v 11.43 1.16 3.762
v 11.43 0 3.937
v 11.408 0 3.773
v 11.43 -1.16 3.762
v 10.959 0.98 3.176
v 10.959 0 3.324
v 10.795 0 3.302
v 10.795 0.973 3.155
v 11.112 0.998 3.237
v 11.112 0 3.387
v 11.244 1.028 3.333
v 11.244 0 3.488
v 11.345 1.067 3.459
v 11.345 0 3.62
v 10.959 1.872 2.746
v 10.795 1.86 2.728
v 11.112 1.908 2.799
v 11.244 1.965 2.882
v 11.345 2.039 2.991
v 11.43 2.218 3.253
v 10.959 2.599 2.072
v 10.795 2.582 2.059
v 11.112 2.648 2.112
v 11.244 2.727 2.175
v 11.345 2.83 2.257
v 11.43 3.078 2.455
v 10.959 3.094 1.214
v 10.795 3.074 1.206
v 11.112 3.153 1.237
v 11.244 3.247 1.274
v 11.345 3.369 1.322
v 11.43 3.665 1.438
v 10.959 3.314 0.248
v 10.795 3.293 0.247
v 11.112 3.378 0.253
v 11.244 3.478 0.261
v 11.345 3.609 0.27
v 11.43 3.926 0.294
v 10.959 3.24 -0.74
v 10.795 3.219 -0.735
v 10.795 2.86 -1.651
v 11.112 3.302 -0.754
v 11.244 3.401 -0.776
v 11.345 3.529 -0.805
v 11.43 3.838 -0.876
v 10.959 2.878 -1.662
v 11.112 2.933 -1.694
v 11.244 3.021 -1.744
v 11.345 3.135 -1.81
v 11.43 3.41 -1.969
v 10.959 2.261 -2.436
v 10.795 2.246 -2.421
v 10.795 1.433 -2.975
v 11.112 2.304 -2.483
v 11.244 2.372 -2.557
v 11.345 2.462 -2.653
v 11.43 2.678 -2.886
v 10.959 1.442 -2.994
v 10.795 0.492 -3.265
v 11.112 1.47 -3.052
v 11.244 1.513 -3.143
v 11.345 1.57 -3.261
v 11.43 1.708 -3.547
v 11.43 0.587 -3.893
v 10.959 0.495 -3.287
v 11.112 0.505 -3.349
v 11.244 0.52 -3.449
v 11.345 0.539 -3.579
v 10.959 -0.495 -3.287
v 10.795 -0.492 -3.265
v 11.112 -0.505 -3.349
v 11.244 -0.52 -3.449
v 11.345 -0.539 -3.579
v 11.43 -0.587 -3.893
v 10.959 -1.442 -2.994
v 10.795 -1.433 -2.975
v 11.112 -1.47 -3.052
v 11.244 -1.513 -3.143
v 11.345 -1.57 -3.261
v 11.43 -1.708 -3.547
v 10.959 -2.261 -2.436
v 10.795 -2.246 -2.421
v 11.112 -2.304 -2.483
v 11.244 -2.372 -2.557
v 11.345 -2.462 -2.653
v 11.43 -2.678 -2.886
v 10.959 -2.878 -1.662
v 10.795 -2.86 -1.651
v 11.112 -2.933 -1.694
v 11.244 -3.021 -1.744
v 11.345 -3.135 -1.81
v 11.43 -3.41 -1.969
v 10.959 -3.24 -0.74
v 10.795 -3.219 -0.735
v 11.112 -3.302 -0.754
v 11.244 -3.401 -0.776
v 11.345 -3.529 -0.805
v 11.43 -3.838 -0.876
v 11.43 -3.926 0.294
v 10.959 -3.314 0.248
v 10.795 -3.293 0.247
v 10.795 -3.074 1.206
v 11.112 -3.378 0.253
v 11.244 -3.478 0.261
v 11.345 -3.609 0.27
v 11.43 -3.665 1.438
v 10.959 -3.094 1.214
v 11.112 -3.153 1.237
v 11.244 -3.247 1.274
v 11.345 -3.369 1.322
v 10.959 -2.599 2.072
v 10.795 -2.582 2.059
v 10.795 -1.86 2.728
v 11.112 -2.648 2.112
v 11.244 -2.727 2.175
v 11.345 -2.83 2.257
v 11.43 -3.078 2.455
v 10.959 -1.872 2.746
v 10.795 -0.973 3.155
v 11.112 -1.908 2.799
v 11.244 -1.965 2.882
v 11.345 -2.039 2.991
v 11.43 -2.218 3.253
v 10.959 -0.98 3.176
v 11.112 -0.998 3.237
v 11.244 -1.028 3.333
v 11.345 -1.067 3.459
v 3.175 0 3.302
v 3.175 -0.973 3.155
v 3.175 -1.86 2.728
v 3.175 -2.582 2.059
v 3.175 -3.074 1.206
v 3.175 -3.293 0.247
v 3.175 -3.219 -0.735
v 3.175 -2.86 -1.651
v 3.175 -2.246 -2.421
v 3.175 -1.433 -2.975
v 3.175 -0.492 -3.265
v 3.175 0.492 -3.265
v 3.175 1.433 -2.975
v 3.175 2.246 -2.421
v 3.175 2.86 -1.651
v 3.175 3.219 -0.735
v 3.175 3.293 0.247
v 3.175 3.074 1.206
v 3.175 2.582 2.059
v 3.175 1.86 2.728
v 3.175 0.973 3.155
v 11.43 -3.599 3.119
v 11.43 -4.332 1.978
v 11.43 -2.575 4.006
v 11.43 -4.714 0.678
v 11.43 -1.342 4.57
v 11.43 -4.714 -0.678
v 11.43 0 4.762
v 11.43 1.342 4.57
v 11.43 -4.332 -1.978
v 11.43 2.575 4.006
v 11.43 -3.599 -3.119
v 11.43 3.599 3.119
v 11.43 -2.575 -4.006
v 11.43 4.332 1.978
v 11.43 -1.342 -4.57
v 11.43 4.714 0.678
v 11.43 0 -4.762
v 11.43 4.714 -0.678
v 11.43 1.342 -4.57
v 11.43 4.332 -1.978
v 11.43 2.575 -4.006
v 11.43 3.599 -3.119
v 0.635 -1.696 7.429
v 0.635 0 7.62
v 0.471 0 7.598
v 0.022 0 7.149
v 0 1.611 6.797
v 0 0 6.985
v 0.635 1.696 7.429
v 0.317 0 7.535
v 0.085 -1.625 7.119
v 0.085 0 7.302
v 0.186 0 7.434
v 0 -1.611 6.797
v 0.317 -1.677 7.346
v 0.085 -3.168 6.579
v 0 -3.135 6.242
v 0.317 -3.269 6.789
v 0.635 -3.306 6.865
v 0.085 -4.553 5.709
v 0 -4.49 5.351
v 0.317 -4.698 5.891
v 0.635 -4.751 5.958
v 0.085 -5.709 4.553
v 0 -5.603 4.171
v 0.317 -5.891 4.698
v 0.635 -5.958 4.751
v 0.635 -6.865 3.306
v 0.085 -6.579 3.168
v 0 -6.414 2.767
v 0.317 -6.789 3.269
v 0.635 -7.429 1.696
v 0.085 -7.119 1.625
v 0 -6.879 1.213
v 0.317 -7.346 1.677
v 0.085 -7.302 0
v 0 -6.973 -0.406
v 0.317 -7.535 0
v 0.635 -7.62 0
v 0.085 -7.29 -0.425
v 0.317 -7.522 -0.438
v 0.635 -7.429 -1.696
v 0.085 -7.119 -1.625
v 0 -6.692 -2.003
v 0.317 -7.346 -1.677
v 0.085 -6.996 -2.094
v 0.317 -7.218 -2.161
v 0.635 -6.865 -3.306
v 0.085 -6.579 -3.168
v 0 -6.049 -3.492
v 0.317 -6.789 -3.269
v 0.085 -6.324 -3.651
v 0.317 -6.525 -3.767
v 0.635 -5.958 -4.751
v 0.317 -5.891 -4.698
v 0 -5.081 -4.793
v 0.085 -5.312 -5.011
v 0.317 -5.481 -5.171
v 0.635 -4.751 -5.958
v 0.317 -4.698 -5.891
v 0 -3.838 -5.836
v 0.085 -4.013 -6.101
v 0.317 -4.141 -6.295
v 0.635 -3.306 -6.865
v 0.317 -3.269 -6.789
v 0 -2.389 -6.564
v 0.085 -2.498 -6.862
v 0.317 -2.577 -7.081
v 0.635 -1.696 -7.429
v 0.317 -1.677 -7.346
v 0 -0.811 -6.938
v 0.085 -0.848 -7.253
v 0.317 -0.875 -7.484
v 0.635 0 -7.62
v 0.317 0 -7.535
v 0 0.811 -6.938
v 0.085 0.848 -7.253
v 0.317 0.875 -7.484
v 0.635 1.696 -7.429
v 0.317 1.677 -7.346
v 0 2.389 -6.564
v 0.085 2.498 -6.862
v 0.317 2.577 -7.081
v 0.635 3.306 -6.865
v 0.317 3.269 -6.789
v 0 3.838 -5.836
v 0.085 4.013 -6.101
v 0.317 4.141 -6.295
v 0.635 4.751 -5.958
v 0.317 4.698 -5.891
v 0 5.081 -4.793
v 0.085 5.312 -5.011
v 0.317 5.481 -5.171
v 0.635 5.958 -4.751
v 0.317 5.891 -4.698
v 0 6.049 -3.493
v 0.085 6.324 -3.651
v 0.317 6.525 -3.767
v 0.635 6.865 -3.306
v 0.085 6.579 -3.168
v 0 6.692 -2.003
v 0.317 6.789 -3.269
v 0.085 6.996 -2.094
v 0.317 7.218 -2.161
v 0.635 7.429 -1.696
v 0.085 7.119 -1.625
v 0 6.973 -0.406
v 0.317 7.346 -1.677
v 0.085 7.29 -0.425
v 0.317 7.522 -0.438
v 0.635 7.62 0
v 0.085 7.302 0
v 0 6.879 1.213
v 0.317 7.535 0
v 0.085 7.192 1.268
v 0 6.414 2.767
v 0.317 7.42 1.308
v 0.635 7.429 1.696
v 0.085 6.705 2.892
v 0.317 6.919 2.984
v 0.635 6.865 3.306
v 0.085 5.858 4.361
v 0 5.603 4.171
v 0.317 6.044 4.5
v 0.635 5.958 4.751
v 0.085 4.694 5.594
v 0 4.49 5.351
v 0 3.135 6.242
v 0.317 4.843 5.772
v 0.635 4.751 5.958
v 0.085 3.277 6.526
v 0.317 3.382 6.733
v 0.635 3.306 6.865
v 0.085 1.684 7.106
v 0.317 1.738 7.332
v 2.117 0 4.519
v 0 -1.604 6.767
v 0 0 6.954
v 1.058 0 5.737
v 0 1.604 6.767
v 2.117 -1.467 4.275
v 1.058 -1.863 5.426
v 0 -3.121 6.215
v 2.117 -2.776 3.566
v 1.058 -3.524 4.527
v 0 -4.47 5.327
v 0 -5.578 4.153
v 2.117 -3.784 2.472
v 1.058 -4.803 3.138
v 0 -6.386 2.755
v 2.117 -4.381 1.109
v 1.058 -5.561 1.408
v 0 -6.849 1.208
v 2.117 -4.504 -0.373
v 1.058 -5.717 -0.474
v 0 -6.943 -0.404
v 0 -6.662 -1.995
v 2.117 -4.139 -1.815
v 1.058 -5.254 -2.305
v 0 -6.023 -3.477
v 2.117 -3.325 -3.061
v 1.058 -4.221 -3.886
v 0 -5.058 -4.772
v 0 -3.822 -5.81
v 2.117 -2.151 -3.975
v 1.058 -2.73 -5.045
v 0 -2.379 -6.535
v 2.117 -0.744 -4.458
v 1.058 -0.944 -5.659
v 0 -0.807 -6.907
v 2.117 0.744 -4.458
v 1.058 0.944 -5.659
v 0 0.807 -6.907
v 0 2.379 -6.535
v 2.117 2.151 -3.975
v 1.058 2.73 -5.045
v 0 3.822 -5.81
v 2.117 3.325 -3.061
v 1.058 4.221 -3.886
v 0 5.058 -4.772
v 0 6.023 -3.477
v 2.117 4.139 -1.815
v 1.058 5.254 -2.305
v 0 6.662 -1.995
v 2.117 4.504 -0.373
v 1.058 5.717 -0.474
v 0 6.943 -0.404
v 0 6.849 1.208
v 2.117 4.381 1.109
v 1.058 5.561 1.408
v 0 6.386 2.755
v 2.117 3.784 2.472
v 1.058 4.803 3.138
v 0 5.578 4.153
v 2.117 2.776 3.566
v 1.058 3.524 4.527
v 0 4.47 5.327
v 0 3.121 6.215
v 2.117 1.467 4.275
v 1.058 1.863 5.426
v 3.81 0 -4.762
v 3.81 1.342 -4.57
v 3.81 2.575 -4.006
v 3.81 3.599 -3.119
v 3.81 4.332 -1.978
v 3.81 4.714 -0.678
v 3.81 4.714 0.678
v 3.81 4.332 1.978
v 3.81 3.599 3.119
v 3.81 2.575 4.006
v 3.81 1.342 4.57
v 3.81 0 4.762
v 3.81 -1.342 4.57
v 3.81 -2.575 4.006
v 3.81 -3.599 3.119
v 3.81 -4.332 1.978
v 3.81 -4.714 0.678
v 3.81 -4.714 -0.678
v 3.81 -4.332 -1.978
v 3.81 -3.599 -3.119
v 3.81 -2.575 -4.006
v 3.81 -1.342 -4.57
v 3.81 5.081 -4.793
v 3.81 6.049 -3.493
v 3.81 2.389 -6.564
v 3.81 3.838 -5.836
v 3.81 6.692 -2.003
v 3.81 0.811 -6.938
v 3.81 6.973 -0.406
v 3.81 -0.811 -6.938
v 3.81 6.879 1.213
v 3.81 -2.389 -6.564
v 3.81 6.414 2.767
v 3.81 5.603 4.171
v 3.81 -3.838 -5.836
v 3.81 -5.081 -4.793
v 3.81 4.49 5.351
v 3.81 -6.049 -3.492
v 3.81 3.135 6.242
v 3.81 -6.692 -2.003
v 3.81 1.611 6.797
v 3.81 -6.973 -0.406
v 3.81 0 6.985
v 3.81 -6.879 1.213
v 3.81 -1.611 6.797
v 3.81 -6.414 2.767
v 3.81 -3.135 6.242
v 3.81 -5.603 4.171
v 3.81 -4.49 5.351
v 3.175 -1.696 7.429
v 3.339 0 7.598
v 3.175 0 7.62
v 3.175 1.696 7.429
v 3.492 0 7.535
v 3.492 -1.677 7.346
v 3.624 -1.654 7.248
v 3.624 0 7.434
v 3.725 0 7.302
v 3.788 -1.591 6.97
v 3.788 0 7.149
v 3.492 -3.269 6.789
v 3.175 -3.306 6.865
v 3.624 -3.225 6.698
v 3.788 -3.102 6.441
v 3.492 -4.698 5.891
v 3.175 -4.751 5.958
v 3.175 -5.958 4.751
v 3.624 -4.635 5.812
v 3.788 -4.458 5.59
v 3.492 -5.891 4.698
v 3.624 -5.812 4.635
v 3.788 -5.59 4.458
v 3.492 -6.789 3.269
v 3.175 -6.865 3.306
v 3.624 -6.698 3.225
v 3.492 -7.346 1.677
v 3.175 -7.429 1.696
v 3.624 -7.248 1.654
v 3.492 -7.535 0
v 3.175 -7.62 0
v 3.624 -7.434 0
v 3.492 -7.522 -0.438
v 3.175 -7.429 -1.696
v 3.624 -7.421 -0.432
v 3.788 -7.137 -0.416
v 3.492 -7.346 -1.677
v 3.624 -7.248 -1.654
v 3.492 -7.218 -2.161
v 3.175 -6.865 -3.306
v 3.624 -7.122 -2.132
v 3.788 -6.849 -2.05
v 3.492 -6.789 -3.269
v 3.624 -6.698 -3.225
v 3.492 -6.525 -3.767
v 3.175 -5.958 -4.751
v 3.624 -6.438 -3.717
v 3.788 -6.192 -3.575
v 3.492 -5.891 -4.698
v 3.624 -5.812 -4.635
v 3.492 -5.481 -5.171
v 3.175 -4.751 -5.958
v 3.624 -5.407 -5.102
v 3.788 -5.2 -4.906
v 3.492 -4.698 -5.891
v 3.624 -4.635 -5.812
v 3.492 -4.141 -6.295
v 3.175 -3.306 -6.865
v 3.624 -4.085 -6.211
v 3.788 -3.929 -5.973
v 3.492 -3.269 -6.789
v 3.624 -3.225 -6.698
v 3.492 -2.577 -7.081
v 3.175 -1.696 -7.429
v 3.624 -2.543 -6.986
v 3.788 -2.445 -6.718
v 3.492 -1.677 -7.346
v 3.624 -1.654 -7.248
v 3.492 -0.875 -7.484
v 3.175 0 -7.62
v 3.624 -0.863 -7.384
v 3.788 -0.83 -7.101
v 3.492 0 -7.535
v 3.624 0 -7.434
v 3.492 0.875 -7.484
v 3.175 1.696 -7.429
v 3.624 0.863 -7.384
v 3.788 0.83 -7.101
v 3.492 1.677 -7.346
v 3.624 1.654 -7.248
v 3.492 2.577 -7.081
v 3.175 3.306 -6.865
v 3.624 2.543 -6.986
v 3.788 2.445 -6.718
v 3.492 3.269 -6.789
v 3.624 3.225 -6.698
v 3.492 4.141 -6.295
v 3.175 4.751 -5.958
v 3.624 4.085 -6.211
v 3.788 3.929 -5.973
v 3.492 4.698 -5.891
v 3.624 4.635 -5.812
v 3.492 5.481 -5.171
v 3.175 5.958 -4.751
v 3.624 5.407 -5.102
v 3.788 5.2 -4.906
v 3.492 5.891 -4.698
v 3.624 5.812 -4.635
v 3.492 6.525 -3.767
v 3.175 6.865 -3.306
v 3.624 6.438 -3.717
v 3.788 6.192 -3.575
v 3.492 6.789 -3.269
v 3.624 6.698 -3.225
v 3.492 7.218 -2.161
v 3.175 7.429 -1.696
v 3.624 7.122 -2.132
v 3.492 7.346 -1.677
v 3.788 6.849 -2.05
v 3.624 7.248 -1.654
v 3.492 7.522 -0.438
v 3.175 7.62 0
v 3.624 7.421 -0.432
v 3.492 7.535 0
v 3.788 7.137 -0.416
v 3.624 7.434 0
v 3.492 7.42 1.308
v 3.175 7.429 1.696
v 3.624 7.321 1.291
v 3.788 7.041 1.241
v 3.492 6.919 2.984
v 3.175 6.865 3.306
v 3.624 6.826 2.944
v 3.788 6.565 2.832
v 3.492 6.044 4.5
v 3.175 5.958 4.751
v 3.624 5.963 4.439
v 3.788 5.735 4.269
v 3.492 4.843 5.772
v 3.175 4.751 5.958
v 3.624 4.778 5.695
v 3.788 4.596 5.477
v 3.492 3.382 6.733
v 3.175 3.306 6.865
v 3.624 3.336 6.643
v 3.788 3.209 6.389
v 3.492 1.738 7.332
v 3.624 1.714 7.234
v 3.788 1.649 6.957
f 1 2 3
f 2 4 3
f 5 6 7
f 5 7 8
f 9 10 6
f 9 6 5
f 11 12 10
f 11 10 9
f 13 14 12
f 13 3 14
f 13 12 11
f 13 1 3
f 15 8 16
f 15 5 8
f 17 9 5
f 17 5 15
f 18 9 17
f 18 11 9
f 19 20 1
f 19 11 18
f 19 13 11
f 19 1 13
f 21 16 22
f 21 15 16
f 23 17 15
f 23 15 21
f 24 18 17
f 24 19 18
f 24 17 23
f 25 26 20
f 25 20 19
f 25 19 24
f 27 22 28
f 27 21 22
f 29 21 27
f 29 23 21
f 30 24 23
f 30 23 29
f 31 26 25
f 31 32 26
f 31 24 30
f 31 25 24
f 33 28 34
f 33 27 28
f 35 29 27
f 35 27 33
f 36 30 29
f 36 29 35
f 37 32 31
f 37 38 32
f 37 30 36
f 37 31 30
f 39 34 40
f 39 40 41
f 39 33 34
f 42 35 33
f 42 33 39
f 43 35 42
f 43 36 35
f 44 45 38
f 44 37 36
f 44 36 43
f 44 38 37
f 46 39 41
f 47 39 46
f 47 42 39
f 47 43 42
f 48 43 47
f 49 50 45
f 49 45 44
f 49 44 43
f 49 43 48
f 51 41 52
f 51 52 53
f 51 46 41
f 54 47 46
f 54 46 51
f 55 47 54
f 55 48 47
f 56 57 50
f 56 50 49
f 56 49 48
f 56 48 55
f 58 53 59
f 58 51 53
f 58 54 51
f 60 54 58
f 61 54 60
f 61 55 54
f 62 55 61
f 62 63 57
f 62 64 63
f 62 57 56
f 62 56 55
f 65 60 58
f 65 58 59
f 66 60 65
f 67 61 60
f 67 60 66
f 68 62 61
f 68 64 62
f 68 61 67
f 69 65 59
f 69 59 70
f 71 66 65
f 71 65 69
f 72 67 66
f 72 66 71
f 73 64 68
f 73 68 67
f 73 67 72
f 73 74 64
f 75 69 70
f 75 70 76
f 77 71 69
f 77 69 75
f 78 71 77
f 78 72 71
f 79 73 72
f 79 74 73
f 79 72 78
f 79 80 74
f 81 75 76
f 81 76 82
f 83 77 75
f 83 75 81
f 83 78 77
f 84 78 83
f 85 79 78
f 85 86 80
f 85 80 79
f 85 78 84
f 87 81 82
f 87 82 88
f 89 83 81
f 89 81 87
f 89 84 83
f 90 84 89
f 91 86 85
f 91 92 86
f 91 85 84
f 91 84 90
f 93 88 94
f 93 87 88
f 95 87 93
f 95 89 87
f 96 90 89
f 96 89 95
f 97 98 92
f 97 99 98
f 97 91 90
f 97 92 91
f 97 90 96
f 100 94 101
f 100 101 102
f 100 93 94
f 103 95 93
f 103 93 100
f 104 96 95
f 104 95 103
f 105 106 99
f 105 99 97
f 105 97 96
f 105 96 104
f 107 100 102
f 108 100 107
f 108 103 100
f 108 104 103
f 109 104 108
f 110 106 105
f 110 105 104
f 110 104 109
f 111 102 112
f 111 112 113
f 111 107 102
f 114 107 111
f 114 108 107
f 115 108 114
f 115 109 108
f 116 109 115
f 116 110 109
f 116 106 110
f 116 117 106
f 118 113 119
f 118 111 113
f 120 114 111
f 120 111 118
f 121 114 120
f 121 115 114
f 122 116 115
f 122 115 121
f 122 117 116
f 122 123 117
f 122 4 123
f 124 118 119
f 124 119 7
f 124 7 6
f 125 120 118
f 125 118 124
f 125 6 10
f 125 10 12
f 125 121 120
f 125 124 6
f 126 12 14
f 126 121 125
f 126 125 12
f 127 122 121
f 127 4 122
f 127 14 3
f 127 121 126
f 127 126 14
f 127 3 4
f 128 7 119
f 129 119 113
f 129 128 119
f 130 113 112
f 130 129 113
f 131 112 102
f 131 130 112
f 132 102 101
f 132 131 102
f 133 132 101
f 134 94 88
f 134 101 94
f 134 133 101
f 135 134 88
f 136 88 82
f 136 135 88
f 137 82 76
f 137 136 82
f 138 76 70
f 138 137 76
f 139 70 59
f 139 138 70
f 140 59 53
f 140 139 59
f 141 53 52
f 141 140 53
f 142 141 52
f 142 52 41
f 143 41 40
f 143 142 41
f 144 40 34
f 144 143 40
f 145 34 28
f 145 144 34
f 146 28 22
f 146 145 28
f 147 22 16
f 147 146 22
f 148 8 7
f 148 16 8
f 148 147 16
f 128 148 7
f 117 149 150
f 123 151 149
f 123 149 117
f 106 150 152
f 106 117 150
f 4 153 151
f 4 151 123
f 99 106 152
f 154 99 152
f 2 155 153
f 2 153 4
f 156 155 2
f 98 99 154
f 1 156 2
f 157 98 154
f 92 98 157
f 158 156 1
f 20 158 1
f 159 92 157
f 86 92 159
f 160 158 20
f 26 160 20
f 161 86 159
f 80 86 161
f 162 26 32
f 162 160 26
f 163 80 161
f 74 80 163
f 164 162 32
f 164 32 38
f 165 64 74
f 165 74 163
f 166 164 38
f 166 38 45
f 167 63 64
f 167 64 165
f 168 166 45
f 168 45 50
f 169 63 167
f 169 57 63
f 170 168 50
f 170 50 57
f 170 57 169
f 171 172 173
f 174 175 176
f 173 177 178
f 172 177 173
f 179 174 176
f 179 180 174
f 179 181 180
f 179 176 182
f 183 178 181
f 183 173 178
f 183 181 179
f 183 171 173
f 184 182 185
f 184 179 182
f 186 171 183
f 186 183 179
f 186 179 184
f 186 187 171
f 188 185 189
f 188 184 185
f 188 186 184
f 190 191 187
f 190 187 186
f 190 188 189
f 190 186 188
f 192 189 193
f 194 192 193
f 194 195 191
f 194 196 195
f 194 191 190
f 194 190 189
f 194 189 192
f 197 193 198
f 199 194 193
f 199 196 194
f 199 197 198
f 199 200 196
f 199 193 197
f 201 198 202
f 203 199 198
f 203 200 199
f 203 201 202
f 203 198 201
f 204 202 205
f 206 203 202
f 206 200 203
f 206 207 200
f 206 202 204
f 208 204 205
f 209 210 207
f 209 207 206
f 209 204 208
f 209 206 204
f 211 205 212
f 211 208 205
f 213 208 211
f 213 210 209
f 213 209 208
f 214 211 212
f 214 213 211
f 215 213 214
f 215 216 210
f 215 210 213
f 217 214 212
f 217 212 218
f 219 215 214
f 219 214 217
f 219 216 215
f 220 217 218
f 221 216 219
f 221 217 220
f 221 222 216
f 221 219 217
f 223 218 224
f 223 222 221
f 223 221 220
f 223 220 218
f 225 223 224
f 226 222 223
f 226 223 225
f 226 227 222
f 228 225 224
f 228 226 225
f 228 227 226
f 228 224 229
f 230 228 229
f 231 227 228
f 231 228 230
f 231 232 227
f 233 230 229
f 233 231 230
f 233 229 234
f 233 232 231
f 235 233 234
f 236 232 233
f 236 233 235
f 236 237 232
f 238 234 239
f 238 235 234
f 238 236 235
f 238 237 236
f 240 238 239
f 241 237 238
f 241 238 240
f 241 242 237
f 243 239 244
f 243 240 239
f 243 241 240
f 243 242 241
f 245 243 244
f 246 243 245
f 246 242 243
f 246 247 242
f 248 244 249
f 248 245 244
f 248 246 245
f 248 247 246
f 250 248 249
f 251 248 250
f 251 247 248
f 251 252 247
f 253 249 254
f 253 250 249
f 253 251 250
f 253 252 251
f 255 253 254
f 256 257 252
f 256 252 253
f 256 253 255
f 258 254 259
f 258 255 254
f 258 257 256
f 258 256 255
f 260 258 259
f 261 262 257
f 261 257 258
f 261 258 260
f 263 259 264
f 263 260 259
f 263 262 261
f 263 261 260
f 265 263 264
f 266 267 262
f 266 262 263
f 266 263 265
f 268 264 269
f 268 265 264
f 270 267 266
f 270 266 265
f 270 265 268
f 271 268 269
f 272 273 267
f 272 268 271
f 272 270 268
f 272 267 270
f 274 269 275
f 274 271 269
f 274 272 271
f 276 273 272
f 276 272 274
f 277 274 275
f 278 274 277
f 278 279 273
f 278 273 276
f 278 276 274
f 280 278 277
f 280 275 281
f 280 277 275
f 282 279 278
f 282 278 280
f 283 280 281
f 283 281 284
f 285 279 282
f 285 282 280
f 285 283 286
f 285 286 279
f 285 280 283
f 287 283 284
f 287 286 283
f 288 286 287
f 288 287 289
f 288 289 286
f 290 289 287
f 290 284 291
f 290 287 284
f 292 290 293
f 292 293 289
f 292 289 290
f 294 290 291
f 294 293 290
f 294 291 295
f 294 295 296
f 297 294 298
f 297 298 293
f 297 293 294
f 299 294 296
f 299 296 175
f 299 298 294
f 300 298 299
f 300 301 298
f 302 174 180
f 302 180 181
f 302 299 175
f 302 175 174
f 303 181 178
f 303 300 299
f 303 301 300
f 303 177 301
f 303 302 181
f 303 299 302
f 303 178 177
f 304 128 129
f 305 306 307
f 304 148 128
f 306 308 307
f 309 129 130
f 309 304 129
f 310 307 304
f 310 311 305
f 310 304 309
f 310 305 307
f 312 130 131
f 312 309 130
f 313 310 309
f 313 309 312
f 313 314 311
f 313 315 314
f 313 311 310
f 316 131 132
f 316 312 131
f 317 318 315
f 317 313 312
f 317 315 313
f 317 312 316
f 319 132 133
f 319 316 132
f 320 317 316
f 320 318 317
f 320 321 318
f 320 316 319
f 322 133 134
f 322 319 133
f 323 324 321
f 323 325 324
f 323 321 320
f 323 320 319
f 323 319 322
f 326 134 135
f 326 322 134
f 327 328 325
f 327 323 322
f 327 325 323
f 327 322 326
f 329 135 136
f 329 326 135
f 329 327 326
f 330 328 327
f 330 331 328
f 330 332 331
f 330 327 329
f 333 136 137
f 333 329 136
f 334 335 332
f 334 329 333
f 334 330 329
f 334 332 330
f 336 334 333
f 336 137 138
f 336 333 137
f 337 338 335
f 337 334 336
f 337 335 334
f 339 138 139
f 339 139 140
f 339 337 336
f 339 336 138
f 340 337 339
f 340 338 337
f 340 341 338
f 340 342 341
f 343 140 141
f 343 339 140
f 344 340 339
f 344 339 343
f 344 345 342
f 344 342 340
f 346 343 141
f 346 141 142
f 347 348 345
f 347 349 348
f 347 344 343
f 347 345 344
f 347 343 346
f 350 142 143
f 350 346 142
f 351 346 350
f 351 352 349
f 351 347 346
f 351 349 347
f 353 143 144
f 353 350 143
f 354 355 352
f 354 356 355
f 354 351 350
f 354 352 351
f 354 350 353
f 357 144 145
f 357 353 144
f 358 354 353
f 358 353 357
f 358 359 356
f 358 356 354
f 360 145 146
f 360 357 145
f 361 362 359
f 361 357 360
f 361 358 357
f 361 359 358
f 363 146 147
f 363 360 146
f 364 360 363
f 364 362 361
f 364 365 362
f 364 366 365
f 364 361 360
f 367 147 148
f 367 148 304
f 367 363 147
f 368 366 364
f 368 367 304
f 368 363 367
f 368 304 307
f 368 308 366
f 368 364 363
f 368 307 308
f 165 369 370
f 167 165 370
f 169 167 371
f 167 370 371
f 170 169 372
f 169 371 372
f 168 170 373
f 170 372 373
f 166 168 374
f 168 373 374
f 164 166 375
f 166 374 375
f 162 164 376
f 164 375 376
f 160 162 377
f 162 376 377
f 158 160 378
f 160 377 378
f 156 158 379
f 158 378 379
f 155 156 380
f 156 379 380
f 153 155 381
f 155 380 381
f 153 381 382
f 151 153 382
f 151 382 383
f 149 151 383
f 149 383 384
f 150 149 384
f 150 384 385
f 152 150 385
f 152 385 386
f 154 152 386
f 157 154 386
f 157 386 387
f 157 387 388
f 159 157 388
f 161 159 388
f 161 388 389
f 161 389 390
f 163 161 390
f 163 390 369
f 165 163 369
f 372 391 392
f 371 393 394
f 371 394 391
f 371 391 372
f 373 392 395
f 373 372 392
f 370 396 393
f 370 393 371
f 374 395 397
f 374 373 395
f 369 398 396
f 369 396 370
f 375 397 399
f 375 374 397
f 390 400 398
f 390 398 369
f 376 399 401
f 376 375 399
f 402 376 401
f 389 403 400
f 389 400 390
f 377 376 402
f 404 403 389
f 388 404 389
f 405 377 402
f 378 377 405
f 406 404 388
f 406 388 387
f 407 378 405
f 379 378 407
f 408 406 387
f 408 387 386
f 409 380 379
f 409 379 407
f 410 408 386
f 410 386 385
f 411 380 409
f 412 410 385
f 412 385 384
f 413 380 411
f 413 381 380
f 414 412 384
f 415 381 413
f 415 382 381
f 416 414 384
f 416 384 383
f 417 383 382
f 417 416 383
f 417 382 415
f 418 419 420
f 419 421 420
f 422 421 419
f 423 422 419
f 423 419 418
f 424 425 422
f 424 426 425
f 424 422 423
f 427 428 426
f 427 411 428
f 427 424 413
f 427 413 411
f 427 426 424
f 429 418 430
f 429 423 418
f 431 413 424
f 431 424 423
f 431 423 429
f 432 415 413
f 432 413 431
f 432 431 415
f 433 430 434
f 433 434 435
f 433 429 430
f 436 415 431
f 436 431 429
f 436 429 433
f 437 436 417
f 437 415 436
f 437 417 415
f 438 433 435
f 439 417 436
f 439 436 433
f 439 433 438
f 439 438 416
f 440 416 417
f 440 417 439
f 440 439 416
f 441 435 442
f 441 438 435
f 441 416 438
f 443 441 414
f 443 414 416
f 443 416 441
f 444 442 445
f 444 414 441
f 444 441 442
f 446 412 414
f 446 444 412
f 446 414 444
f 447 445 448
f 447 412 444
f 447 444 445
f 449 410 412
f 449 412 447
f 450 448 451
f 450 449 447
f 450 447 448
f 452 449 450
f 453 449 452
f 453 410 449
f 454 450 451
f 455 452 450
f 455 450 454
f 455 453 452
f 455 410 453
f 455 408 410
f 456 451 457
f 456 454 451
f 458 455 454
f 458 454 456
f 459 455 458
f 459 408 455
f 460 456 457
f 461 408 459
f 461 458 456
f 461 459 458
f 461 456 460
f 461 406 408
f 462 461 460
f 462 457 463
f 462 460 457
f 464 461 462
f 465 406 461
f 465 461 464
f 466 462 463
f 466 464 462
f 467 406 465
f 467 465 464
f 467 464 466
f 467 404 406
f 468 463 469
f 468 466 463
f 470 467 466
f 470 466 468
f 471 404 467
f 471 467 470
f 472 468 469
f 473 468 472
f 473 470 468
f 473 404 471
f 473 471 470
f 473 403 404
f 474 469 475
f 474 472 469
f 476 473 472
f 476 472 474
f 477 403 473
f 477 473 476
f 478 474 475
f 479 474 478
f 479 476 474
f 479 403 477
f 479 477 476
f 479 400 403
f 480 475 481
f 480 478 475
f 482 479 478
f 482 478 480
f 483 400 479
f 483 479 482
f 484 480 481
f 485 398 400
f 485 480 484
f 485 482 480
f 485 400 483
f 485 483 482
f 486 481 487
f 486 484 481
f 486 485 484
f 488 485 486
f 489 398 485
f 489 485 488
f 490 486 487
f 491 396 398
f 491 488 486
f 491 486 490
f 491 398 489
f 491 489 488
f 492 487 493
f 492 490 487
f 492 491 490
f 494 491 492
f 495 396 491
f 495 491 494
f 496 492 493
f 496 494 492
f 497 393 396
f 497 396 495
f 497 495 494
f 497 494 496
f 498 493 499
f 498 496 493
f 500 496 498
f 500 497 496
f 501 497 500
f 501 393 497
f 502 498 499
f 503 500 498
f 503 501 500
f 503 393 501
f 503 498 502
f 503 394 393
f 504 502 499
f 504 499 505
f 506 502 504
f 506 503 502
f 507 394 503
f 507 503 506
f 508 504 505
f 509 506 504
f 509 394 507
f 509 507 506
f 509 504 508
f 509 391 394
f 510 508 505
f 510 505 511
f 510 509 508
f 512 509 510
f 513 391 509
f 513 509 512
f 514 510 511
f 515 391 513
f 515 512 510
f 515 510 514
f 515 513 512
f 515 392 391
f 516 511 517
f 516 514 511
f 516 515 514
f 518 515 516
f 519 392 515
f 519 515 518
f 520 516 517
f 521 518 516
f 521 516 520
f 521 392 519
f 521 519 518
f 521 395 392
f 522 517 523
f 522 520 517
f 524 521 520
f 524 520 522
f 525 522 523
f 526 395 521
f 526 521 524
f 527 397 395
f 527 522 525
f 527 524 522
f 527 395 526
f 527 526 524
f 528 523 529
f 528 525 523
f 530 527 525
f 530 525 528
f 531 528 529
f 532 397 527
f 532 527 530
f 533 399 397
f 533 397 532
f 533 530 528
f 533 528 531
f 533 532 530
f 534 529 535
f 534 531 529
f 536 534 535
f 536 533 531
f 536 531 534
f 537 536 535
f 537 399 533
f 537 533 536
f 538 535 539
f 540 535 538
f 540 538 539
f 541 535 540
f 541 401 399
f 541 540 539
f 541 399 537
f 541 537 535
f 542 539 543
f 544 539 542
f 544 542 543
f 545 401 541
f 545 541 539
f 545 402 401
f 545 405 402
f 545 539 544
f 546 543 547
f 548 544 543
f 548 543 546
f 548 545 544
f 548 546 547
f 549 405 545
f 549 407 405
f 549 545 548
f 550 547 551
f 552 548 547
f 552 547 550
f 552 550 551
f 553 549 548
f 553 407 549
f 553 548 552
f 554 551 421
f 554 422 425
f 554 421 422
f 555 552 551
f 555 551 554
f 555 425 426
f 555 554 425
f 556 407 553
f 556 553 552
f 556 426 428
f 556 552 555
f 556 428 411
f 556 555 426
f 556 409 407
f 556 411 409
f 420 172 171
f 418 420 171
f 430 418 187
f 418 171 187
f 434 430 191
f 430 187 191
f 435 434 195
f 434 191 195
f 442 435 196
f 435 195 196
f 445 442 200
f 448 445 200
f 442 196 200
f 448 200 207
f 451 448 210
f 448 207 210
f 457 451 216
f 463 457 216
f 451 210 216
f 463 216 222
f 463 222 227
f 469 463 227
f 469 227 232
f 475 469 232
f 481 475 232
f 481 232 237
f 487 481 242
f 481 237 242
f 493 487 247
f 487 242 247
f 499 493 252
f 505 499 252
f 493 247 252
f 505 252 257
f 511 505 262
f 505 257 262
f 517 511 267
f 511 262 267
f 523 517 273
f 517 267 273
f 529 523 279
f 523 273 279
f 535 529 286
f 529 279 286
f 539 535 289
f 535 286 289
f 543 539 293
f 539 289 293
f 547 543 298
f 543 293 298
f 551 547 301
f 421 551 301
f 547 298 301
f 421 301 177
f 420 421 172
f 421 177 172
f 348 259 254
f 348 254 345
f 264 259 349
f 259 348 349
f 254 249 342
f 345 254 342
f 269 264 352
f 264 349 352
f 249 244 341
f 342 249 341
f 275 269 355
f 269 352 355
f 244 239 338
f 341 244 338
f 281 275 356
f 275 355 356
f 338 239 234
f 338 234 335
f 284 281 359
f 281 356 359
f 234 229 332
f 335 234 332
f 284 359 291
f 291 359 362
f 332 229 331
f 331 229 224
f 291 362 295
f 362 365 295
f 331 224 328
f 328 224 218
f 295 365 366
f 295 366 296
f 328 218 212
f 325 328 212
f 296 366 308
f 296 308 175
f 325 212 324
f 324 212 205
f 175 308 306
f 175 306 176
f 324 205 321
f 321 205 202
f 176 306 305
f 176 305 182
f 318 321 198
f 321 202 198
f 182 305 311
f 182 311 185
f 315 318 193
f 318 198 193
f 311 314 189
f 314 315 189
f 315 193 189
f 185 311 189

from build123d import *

# Parameters (mm, degrees)
SKETCH1_R           = 7.62
SKETCH1_R_2         = 3.302
BOSS_EXTRUDE1_DEPTH = 3.81
SKETCH2_R           = 4.7625
SKETCH2_R_2         = 3.302
BOSS_EXTRUDE2_DEPTH = 10.795
FILLET1_R           = 0.635
CHAMFER1_SIZE       = 3.175
CHAMFER1_SIZE2      = 3.652419693
CUT_EXTRUDE1_START  = -3.175
SKETCH3_R           = 4.7625
CUT_EXTRUDE1_DEPTH  = 3.175
FILLET2_R           = 0.635


with BuildPart() as part:
    # Sketch1 → Boss-Extrude1 (new body)
    with BuildSketch(Plane(origin=(0, 0, 0), x_dir=(0, 0, -1), z_dir=(1, 0, 0))):
        with Locations(Location((0, 0, 0), (0, 0, 180))):
            Circle(SKETCH1_R)
        with Locations(Location((0, 0, 0), (0, 0, 180))):
            Circle(SKETCH1_R_2, mode=Mode.SUBTRACT)
    extrude(amount=BOSS_EXTRUDE1_DEPTH)

    # Sketch2 → Boss-Extrude2 (add)
    with BuildSketch(Plane(origin=(3.81, 0, 0), x_dir=(0, 0, -1), z_dir=(1, 0, 0))):
        Circle(SKETCH2_R)
        with Locations(Location((0, 0, 0), (0, 0, 180))):
            Circle(SKETCH2_R_2, mode=Mode.SUBTRACT)
    extrude(amount=BOSS_EXTRUDE2_DEPTH)

    # Fillet1
    fillet1_edges = [part.edges().sort_by_distance(p)[0] for p in [
        (14.605, 0, -3.302),
        (0, 0, -7.62),
        (3.81, 0, -7.62),
    ]]
    fillet(fillet1_edges, radius=FILLET1_R)

    # Chamfer1
    chamfer1_edges = [part.edges().sort_by_distance(p)[0] for p in [
        (0, 0, -3.302),
    ]]
    chamfer1_side = [part.faces().sort_by_distance(p)[0] for p in [
        (6.985, 0, -3.302),
    ]]
    chamfer(chamfer1_edges, length=CHAMFER1_SIZE, length2=CHAMFER1_SIZE2, reference=chamfer1_side[0])

    # Sketch3 → Cut-Extrude1 (cut)
    with BuildSketch(Plane(origin=(14.605, 0, 0), x_dir=(0, 0, -1), z_dir=(1, 0, 0)).offset(CUT_EXTRUDE1_START)):
        Circle(SKETCH3_R)
    extrude(amount=CUT_EXTRUDE1_DEPTH, mode=Mode.SUBTRACT)

    # Fillet2
    fillet2_edges = [part.edges().sort_by_distance(p)[0] for p in [
        (11.43, 0, -3.302),
    ]]
    fillet(fillet2_edges, radius=FILLET2_R)


solid = part.part
